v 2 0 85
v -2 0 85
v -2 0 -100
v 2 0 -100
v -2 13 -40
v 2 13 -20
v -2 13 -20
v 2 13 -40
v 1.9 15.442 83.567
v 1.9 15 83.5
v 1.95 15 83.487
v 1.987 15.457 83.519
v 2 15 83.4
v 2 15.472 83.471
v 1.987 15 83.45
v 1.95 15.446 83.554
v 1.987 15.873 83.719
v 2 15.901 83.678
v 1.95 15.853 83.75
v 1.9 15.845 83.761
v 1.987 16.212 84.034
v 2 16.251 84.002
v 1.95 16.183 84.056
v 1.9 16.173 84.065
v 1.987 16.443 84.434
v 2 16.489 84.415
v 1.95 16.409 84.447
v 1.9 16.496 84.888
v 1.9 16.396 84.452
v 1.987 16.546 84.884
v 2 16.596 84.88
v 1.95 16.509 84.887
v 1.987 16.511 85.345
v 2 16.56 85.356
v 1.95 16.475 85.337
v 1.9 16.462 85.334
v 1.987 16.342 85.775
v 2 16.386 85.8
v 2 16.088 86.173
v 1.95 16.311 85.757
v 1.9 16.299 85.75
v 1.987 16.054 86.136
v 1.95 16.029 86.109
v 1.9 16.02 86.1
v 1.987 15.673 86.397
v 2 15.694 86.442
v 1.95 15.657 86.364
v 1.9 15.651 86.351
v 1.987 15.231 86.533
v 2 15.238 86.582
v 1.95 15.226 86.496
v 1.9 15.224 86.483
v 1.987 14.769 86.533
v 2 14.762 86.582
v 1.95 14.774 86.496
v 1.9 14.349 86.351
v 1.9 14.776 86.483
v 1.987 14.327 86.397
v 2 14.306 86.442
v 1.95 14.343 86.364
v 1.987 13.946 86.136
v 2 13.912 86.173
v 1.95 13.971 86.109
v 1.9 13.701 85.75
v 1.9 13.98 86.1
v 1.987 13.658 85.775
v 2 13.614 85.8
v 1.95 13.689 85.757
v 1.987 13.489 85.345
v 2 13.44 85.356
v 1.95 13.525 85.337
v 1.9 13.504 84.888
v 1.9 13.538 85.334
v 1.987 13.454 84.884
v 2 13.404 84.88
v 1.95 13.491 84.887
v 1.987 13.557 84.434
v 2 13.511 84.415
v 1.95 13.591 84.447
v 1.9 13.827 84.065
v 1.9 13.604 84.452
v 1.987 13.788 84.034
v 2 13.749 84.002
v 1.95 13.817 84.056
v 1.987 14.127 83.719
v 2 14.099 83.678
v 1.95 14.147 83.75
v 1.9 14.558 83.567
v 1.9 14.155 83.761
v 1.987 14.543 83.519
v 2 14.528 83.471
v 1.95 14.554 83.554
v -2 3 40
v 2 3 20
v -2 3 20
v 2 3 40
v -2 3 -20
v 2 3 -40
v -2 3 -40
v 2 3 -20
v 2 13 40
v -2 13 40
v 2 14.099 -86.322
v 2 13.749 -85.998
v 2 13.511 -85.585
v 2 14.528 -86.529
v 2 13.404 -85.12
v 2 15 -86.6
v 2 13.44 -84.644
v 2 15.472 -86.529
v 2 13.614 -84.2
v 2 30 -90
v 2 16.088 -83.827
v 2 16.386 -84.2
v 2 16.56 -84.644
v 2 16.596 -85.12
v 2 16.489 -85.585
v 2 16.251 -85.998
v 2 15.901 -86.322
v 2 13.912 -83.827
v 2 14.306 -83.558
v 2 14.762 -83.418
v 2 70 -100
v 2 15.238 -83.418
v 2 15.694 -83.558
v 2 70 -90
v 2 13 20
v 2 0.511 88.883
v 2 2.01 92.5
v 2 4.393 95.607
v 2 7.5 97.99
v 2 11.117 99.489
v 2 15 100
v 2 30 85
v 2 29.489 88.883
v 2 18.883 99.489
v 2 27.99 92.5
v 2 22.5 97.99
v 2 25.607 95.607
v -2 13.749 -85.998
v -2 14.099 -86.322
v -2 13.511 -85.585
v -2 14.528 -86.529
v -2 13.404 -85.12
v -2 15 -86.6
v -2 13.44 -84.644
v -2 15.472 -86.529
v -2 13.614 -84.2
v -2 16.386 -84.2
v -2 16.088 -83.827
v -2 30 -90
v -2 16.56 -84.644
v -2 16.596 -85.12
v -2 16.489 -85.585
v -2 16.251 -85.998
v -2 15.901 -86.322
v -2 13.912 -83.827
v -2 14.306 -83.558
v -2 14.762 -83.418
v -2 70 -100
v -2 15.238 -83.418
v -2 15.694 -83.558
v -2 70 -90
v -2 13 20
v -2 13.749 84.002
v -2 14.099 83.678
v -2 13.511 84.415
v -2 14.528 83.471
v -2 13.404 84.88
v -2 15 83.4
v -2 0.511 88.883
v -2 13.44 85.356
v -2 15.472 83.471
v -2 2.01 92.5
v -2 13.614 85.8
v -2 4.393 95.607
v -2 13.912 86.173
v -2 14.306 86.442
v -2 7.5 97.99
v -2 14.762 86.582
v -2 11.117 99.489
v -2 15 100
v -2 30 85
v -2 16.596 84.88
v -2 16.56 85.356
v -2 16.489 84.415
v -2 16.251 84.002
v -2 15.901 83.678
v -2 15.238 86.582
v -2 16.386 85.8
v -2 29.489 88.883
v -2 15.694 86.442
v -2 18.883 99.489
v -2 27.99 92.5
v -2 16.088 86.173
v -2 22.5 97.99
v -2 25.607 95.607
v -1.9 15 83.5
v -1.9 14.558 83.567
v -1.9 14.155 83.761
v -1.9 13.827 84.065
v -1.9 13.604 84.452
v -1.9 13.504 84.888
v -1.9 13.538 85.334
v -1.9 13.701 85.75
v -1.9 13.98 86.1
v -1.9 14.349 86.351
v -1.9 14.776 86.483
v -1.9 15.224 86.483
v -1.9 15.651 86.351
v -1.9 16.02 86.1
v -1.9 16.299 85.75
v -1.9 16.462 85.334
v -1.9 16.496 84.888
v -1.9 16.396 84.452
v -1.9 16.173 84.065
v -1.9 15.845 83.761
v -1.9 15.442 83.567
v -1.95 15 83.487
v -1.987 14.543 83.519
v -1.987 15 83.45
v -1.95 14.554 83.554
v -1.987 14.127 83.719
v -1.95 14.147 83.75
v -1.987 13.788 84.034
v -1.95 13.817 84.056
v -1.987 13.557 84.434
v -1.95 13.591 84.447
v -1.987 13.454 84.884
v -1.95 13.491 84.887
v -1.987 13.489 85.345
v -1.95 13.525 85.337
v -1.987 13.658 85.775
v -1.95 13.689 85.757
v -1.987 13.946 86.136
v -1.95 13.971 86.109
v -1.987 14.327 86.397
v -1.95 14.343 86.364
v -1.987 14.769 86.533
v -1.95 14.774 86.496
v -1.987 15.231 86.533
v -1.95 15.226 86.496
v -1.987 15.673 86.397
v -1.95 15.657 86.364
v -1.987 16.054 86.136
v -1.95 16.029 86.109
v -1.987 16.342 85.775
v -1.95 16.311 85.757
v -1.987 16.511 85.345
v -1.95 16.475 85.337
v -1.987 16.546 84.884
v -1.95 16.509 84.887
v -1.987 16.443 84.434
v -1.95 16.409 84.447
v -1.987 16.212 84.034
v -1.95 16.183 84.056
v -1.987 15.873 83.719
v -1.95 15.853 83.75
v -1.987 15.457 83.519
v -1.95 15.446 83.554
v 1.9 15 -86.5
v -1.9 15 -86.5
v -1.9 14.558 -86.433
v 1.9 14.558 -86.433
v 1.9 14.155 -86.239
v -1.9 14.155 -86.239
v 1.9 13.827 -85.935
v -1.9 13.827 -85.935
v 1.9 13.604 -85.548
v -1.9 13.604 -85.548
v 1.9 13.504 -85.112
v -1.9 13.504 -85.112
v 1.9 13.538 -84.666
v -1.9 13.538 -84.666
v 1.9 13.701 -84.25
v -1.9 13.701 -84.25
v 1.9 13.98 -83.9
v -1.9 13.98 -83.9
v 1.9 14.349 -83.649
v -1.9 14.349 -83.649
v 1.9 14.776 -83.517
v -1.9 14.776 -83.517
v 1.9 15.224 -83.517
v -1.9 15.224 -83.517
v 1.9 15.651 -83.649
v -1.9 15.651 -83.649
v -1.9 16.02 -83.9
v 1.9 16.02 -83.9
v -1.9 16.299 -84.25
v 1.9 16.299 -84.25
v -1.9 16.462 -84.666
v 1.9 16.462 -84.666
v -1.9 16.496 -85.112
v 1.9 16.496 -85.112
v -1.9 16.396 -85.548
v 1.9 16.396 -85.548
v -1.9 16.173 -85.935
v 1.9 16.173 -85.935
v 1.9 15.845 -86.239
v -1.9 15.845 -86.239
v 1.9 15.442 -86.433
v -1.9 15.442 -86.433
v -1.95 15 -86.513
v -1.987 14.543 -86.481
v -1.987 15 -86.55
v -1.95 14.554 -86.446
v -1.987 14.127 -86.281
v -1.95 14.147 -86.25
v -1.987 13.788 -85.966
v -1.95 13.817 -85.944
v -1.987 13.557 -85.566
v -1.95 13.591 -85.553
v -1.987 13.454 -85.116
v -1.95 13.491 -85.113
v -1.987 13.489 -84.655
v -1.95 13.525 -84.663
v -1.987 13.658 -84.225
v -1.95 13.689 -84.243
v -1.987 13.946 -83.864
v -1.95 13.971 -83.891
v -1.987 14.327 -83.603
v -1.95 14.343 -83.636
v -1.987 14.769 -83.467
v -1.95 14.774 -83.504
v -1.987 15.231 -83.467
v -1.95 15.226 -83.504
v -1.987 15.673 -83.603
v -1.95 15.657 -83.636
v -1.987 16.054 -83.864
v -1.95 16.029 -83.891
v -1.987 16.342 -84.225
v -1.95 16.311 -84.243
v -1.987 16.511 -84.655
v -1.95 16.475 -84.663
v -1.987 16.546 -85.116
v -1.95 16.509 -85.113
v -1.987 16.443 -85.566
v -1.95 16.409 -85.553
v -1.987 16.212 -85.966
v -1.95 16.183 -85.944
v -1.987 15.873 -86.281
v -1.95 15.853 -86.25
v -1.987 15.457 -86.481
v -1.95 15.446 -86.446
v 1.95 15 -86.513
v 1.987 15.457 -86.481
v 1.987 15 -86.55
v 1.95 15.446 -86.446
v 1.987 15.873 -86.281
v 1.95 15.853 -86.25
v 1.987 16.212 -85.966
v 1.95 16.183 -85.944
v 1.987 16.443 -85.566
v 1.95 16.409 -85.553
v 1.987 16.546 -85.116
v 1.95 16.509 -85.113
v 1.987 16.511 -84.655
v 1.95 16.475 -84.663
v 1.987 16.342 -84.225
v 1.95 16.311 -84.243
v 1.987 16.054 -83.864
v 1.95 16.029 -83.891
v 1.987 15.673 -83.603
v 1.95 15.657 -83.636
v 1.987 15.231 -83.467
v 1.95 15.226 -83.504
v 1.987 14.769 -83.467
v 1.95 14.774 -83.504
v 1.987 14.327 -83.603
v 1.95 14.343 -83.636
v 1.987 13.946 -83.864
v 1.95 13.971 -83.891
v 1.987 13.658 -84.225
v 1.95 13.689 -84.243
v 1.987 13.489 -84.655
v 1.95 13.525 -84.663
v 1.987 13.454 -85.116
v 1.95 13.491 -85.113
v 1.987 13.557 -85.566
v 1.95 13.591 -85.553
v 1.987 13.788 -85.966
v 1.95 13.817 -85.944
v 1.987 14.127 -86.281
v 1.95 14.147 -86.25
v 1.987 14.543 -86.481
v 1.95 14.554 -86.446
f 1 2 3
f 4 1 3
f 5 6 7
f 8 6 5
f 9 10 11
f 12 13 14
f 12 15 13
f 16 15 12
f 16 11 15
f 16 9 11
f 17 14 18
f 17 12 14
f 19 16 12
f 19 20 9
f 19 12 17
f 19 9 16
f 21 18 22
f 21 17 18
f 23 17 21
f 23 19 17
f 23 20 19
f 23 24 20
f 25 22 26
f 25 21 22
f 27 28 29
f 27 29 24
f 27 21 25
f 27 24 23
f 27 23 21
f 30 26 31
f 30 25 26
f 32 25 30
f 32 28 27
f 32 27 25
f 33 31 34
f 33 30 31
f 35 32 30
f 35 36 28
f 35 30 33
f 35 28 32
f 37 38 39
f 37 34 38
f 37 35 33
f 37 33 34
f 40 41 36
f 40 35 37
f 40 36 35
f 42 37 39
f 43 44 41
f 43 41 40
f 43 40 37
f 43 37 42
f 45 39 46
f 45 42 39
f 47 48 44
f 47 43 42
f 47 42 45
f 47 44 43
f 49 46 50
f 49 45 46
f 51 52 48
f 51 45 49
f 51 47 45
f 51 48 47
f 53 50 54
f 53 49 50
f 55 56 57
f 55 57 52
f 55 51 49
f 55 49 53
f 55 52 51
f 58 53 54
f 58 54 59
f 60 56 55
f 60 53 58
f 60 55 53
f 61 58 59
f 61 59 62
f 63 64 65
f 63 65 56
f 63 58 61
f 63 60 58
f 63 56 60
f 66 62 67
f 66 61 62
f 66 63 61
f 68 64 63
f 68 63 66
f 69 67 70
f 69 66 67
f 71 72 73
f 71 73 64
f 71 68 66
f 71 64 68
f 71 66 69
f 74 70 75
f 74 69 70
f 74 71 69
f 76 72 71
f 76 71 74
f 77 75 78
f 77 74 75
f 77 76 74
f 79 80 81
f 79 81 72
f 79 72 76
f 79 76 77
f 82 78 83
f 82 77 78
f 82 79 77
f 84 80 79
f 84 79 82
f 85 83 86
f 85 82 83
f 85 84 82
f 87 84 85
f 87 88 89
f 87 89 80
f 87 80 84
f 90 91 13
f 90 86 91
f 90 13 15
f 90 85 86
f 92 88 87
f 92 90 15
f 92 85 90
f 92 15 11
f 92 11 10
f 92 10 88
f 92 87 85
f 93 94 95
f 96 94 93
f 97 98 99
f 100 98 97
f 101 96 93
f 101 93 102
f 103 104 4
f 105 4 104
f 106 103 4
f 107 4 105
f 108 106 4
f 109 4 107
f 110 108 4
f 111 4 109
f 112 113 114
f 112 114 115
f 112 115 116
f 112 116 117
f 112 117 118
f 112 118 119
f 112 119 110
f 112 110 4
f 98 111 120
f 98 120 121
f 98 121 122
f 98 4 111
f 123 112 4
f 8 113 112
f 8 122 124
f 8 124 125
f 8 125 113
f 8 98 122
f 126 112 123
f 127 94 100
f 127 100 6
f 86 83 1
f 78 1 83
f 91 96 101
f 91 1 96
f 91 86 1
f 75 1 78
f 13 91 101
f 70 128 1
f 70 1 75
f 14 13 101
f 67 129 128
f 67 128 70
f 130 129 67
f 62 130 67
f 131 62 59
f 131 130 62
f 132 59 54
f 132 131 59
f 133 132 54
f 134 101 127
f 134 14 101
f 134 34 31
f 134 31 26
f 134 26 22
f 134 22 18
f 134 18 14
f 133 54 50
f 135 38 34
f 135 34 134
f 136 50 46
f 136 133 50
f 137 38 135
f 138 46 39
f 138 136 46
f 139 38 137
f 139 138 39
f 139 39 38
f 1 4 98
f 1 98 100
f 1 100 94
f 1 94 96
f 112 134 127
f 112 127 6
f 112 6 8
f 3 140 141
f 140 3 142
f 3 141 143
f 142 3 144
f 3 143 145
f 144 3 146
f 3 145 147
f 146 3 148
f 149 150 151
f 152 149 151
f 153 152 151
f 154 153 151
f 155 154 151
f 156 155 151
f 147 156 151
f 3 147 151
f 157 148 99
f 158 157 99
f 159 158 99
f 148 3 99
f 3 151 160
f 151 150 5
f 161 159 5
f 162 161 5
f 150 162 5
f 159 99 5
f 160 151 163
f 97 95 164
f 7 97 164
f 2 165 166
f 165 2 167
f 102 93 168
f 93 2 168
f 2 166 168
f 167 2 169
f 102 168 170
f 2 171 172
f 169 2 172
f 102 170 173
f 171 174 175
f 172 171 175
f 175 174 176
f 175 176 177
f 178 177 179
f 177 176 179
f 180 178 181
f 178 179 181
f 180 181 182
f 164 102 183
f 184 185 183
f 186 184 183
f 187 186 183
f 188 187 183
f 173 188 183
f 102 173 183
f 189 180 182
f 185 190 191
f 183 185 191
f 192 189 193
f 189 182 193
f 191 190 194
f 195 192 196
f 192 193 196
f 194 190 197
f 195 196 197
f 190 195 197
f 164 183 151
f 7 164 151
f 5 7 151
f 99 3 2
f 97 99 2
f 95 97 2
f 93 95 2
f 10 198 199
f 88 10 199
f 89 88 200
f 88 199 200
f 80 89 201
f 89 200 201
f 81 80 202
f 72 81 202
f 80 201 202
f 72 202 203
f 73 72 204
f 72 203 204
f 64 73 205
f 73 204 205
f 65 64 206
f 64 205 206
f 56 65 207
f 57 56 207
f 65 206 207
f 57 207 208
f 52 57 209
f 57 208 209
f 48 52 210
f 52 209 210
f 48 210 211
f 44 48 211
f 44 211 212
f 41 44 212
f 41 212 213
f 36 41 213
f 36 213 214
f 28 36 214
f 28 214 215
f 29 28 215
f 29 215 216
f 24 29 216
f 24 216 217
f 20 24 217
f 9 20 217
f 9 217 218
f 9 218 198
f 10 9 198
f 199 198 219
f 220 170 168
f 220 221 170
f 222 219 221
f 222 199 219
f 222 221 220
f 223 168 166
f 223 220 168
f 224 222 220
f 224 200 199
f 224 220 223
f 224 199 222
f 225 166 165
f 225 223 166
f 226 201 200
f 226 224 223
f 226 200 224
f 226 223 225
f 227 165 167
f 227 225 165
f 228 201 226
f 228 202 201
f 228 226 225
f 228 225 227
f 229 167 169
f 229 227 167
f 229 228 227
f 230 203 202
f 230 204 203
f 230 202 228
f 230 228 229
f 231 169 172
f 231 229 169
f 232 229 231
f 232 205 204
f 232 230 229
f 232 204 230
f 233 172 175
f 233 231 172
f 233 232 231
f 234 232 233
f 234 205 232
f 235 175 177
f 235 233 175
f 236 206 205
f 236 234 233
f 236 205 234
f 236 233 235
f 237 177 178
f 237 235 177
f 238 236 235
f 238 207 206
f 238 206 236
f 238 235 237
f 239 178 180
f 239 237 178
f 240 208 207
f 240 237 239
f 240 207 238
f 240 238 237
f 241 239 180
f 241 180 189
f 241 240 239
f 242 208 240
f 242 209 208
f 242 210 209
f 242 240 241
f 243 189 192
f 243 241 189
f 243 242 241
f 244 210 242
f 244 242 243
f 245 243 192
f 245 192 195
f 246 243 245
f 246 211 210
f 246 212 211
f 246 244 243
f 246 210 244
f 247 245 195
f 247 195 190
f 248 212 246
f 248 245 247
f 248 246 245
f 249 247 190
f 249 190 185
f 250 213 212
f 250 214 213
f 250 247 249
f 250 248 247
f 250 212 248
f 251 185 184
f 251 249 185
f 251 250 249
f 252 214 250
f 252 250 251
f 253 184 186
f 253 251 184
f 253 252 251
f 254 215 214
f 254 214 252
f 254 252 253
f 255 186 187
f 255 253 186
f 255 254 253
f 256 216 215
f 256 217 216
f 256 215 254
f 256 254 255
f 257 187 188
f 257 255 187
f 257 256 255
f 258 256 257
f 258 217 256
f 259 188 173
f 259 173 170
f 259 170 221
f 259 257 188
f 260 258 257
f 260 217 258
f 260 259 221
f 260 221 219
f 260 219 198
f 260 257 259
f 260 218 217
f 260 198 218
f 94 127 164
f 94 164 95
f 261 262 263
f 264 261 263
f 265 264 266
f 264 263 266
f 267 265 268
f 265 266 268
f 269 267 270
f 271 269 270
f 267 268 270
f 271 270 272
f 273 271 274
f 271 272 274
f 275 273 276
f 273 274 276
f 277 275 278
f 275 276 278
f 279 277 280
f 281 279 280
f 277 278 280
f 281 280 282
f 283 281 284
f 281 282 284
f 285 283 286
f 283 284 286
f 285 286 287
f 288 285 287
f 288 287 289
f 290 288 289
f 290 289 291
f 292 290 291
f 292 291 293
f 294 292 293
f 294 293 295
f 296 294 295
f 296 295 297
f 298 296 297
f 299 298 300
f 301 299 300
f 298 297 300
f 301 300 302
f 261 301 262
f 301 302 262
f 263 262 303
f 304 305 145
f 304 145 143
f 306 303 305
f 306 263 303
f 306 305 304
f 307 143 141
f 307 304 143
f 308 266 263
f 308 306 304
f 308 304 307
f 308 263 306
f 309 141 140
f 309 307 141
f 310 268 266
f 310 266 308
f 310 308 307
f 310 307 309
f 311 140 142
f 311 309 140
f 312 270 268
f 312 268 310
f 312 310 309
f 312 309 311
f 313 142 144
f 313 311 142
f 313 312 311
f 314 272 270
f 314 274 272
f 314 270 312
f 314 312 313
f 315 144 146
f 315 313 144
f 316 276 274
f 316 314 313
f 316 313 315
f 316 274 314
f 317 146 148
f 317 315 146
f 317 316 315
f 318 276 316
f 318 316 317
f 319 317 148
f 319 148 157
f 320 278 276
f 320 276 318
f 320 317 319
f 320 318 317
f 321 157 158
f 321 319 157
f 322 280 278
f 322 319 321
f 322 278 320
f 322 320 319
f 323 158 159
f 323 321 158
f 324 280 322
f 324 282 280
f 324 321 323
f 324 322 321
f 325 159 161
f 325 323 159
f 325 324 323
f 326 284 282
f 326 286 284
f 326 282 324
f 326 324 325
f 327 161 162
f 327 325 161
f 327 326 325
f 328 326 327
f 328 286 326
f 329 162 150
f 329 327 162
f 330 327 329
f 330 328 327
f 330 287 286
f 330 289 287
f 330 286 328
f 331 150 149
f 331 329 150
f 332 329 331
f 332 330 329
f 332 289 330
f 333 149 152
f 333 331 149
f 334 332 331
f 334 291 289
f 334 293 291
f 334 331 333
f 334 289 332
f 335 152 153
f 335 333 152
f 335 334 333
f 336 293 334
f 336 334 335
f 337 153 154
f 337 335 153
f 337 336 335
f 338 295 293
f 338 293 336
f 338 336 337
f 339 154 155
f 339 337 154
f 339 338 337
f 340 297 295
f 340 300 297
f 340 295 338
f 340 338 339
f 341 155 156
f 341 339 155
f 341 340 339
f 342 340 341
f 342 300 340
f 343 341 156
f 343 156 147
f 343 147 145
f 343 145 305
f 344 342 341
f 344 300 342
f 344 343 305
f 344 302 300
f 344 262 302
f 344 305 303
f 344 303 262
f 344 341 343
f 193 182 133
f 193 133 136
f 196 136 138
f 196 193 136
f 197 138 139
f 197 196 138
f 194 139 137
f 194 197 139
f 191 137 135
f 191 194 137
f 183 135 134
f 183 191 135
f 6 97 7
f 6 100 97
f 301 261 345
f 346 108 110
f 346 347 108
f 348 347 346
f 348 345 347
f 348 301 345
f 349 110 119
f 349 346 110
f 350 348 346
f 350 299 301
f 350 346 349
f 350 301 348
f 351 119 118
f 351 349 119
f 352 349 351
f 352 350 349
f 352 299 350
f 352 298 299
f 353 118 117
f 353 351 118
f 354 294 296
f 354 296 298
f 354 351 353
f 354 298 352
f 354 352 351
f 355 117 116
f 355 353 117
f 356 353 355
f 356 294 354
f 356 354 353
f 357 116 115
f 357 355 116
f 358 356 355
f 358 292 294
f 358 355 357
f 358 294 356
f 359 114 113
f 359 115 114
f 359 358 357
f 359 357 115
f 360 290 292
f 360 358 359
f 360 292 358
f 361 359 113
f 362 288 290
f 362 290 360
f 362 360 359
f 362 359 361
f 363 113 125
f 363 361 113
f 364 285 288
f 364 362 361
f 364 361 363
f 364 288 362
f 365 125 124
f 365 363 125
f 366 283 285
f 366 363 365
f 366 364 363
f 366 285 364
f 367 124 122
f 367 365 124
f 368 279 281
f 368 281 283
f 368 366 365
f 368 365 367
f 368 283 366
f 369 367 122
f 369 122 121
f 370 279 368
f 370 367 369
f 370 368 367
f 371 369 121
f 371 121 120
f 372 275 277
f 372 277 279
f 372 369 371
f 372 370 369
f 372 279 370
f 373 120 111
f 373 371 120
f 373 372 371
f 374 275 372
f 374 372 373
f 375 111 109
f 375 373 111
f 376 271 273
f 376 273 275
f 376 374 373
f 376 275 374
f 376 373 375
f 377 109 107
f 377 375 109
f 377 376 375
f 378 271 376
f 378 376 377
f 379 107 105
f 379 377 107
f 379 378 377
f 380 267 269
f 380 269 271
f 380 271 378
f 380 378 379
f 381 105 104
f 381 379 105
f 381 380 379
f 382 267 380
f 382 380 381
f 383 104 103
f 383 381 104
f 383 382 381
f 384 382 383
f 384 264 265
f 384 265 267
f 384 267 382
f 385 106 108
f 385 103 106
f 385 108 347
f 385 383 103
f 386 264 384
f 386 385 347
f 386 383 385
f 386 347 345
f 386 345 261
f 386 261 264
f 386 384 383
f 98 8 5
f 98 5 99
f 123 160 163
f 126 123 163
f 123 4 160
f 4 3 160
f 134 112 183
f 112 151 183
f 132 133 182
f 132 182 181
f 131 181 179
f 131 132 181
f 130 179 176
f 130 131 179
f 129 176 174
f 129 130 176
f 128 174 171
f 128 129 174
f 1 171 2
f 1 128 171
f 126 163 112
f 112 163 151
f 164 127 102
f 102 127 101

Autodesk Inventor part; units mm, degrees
ref_plane "YZ Plane" through (0, 0, 0) normal (1, 0, 0) x (0, 1, 0)
ref_plane "XZ Plane" through (0, 0, 0) normal (0, 1, 0) x (-1, 0, 0)
ref_plane "XY Plane" through (0, 0, 0) normal (0, 0, 1) x (1, 0, 0)
sketch "Эскиз1" plane through (0, 0, 0) normal (1, 0, 0) x (0, 1, 0)
  line L0 (0, 100) -> (0, -100)
  line L1 (0, -100) -> (30, -100)
  line L2 (30, -100) -> (30, 100)
  line L3 (30, 100) -> (0, 100)
  line L4 (-14, 0) -> (84, 0) construction
  line L5 (0, -140) -> (0, 140) construction
  line L6 (30, -100) -> (70, -100)
  line L7 (70, -100) -> (70, -90)
  line L8 (70, -90) -> (30, -90)
  line L9 (30, -90) -> (30, -100)
  point P0 (0, 0)
  dimension "d0" = 200
  dimension "d1" = 30
  dimension "d2" = 10
  dimension "d3" = 40
extrude "Выдавливание1" add sketch "Эскиз1" along normal mid plane 4
fillet "Сопряжение1" radius 15 2 edges at (0, 30, 100) (0, 0, 100)
sketch "Эскиз2" plane through (2, 0, 0) normal (1, 0, 0) x (0, 0, -1)
  line L0 (-20, 13) -> (-40, 13)
  line L1 (-85, 0) -> (100, 0) construction
  line L2 (100, 0) -> (100, 70) projected
  line L3 (-40, 13) -> (-20, 13)
  line L4 (-20, 13) -> (-20, 3)
  line L5 (-20, 3) -> (-40, 3)
  line L6 (-40, 3) -> (-40, 13)
  line L7 (20, 13) -> (40, 13)
  line L8 (40, 13) -> (40, 3)
  line L9 (40, 3) -> (20, 3)
  line L10 (20, 3) -> (20, 13)
  point P0 (0, 0)
  point P1 (57.0517, 0.6179)
  dimension "d26" = 10
  dimension "d27" = 20
  dimension "d28" = 3
  dimension "d29" = 20
  dimension "d31" = 20
  dimension "d34" = 3
  dimension "d35" = 10
  dimension "d36" = 20
extrude "Выдавливание2" cut sketch "Эскиз2" against normal blind 4
sketch "Эскиз3" plane through (2, 0, 0) normal (1, 0, 0) x (0, 0, -1)
  arc A0 (-85, 30) -> (-85, 0) centre (-85, 15) ccw projected
  line L0 (90, 30) -> (-85, 30) projected
  line L1 (100, 0) -> (100, 70) projected
  point P0 (0, 0)
  point P1 (85, 15)
  dimension "d16" = 15
  dimension "d17" = 15
hole "Отверстие1" at (2, 15, -85) at (2, 15, 85) direction (-1, 0, 0) diameter 3 depth 4
fillet "Сопряжение2" radius 0.1 4 edges at (2, 15, -83.5) (2, 15, 86.5) (-2, 15, -83.5) (-2, 15, 86.5)
properties part number "Стенка конвейера"
